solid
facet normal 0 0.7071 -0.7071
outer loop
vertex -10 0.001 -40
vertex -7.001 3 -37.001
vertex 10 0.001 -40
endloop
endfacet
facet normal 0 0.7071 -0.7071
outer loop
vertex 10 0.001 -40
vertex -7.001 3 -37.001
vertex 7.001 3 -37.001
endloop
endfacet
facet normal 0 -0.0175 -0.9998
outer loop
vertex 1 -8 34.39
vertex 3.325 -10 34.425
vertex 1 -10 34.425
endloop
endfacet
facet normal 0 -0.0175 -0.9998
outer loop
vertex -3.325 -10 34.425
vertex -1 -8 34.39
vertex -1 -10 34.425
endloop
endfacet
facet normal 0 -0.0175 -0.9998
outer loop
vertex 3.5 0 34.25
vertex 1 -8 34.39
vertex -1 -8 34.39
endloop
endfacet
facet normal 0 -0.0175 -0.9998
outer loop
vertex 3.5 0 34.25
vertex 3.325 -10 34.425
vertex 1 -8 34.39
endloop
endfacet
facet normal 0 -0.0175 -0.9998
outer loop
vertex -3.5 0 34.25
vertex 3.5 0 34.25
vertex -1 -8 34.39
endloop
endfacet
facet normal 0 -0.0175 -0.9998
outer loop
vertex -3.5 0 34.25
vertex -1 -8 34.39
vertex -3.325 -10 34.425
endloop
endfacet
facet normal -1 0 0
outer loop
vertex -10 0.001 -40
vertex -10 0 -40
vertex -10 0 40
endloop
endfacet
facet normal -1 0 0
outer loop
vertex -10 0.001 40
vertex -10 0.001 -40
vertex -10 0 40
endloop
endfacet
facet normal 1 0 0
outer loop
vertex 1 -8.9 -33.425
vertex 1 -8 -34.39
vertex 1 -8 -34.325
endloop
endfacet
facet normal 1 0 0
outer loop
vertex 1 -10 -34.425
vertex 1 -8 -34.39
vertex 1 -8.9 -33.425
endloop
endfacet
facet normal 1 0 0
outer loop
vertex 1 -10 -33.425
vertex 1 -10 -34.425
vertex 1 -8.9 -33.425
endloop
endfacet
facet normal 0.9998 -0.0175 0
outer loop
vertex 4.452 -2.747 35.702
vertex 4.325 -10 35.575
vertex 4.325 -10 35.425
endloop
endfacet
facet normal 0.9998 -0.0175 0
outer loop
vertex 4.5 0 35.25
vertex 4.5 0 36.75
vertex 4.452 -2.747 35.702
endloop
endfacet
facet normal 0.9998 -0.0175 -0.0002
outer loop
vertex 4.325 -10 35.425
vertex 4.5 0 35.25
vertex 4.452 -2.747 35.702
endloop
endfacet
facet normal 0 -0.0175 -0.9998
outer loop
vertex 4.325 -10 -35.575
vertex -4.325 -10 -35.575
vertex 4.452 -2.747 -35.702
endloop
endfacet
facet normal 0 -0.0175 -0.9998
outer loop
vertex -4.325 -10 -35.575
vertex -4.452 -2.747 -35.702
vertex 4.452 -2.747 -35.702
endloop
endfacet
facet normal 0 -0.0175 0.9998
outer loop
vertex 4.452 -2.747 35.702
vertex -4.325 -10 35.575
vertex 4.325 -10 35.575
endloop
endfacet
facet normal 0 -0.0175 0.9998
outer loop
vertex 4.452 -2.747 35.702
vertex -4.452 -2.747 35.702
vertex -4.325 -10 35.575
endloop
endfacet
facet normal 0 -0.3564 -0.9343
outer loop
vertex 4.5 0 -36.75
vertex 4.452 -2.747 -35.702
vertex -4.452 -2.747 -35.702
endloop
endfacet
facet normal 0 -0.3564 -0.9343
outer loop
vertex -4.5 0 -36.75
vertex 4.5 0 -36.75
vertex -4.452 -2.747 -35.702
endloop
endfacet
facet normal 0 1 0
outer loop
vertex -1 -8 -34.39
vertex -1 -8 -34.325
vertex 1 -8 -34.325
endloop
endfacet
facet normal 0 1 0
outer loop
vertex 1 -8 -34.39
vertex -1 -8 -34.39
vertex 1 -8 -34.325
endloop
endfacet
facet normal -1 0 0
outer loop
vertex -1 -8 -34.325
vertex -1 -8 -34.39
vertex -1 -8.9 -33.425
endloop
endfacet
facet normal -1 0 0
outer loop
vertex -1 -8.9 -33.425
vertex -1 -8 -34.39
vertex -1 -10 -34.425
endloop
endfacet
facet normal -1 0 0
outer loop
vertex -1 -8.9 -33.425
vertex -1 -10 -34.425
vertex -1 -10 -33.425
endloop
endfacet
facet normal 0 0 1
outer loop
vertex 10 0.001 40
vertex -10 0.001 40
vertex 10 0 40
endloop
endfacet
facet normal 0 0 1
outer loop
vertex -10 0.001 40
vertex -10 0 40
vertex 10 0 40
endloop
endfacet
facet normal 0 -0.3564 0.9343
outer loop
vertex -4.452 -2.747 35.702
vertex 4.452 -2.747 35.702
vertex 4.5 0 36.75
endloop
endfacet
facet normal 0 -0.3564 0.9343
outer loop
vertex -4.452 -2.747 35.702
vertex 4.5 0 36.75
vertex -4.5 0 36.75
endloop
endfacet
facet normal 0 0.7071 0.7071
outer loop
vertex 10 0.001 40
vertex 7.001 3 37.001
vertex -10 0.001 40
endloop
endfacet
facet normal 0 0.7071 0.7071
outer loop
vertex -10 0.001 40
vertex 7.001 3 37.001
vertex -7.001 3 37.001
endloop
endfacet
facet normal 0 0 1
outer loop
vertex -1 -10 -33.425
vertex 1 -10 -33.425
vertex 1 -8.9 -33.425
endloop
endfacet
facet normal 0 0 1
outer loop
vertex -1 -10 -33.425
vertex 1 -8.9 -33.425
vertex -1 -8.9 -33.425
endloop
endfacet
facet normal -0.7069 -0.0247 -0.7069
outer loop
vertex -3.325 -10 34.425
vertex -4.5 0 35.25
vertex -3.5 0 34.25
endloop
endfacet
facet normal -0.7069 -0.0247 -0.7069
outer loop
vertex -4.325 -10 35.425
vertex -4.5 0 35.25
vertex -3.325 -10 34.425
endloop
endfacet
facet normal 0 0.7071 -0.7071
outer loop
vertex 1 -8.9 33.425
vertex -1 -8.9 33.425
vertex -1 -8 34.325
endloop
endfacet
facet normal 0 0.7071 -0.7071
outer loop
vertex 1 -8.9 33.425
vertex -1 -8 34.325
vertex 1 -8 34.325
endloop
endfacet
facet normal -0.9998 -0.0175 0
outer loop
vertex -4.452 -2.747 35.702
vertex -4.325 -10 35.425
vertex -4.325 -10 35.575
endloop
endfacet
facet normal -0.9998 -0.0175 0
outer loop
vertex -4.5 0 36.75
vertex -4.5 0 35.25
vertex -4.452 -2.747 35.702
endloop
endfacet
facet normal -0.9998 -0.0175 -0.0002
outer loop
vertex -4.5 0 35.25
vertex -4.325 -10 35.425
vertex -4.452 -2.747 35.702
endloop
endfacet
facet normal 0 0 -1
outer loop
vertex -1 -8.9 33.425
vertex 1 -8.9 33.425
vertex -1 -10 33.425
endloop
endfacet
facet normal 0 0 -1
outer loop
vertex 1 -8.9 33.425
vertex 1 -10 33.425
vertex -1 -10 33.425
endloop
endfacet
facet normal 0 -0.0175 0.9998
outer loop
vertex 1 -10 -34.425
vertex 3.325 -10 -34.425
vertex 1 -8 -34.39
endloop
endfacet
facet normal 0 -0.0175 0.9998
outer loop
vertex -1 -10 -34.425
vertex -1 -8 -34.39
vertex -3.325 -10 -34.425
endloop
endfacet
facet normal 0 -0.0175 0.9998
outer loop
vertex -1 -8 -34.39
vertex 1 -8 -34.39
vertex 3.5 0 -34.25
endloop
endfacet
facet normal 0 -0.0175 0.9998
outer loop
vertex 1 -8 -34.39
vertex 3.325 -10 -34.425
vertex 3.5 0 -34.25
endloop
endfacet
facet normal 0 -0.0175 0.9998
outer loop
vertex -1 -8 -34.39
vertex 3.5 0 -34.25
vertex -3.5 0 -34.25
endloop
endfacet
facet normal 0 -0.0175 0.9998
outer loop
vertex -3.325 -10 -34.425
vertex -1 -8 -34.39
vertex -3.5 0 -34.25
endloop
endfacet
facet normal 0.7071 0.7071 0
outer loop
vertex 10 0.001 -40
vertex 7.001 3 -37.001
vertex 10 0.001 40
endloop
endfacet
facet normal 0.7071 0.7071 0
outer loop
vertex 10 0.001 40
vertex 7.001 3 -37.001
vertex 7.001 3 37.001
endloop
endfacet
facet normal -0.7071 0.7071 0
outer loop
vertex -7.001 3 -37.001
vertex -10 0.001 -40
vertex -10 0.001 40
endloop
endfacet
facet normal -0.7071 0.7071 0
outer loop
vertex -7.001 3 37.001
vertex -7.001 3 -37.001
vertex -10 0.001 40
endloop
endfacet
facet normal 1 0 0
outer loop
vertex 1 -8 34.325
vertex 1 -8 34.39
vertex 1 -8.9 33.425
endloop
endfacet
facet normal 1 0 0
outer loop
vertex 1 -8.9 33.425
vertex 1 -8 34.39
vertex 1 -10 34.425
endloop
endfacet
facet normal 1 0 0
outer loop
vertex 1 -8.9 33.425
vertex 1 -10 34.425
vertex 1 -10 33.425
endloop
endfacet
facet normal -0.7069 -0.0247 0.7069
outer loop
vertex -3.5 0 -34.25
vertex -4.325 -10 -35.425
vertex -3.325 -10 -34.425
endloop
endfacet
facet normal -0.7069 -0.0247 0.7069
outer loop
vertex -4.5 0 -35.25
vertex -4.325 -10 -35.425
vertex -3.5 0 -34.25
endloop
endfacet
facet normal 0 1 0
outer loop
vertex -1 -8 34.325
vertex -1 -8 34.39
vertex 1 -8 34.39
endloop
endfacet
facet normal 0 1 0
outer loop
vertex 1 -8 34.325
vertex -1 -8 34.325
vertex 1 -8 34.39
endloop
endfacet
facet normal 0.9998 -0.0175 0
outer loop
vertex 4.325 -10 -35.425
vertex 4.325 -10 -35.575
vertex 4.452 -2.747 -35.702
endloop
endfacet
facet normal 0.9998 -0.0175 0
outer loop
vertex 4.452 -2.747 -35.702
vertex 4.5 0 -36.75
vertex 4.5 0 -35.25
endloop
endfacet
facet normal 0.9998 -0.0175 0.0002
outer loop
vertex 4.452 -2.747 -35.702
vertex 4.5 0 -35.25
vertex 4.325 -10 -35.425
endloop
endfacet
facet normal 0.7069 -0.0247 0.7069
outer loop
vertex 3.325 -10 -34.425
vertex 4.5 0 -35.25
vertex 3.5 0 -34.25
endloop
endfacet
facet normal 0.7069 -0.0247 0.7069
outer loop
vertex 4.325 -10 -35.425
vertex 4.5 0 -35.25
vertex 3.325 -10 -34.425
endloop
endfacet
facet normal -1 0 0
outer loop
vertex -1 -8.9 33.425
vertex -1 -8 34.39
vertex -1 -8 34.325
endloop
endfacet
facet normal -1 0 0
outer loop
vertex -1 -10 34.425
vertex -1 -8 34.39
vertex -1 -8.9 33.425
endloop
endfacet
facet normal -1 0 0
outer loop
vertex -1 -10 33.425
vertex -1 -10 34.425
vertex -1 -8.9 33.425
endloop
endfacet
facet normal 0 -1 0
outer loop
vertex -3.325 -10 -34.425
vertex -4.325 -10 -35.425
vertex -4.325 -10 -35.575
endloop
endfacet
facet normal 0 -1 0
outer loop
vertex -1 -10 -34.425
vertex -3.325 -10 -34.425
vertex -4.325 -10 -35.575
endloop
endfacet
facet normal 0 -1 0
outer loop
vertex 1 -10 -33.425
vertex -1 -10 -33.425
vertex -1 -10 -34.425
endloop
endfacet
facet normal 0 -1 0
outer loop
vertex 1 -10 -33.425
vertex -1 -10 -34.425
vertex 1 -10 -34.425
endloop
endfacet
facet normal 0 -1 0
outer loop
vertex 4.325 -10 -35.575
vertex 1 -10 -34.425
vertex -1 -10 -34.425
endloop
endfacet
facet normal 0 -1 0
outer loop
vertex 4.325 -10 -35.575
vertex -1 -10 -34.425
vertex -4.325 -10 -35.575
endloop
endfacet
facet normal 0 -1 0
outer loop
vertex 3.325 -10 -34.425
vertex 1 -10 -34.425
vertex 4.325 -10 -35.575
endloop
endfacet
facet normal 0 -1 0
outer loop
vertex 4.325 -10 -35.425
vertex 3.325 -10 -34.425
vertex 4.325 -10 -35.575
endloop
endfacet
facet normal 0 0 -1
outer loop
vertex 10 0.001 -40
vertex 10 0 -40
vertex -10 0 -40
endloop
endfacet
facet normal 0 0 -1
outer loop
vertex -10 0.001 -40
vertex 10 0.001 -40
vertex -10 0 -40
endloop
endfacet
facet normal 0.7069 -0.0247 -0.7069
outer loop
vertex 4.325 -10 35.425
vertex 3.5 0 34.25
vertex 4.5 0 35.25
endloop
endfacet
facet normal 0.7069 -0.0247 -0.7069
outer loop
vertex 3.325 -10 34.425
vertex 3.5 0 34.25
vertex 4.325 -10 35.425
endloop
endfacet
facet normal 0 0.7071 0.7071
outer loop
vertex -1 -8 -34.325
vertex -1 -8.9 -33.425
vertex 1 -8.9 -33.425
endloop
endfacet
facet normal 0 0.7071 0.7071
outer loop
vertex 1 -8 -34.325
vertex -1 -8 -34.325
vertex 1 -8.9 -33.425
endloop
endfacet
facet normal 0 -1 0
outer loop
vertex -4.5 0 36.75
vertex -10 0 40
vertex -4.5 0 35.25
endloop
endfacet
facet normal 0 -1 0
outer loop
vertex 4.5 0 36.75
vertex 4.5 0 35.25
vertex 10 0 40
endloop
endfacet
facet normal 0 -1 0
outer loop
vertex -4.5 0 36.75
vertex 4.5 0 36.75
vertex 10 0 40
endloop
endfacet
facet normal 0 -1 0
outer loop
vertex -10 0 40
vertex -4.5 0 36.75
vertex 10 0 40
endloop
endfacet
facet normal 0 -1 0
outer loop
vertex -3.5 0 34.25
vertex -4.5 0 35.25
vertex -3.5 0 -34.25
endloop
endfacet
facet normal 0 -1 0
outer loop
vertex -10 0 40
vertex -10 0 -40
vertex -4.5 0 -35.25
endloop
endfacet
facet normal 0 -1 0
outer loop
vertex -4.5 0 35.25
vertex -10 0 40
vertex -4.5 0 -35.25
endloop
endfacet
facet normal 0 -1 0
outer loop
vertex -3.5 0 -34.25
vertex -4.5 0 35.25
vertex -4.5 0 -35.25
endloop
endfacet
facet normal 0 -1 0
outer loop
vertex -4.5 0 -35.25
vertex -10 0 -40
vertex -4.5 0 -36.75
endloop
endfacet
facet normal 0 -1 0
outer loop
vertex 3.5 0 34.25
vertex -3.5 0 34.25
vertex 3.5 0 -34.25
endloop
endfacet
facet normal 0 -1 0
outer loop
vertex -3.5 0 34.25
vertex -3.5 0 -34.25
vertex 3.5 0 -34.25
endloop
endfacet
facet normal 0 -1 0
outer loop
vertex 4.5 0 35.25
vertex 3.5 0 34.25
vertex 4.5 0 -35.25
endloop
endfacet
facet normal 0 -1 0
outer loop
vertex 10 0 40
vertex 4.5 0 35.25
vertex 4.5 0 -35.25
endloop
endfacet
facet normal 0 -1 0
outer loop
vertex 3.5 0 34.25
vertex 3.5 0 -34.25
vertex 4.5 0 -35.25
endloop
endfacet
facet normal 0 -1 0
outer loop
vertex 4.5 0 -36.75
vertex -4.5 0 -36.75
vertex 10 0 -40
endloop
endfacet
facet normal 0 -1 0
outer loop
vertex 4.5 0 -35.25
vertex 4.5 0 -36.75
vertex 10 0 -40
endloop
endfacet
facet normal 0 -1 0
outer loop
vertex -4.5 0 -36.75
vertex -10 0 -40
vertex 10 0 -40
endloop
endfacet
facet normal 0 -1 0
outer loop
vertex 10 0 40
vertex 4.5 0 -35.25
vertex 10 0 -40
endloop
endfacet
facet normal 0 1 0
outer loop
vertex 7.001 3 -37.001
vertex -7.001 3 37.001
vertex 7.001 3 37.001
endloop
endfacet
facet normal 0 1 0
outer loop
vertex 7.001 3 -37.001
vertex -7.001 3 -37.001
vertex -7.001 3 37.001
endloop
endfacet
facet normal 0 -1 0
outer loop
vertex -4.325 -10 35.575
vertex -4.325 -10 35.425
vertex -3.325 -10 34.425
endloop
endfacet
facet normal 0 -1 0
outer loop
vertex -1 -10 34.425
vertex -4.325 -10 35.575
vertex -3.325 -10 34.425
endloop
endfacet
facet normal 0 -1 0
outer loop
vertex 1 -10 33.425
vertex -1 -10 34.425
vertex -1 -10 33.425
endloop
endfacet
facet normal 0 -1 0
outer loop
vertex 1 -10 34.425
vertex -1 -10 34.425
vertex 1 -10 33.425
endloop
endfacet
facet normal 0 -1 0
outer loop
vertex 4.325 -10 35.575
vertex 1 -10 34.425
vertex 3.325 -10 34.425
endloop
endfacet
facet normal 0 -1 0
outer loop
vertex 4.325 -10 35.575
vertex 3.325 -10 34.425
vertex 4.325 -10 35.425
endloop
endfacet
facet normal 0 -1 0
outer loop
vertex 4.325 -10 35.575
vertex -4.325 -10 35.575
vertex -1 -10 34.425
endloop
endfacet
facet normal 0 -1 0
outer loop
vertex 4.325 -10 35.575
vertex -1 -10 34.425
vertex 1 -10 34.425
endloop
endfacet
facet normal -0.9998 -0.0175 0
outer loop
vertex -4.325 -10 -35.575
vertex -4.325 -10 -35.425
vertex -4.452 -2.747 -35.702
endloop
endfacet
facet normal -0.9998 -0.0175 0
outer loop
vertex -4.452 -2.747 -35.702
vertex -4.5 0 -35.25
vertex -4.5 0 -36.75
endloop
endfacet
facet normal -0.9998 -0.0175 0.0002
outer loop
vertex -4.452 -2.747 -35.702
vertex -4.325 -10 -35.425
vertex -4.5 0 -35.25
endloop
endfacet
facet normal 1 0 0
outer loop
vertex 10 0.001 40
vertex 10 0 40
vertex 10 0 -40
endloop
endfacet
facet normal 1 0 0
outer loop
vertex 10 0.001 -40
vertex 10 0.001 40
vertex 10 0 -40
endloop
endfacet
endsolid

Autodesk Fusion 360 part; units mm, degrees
sketch "Sketch1" plane through (0, 0, 0) normal (0, 1, 0) x (1, 0, 0)
  line L0 (10, 40) -> (-10, 40)
  line L1 (-10, 40) -> (-10, -40)
  line L2 (-10, -40) -> (10, -40)
  line L3 (10, -40) -> (10, 40)
  line L4 (10, 40) -> (-10, -40) construction
  line L5 (-10, 40) -> (10, -40) construction
  dimension "d1" = 20
  dimension "d2" = 80
extrude "Extrude1" add sketch "Sketch1" along normal blind 3
sketch "Sketch2" plane through (0, 0, 0) normal (0, -1, 0) x (1, 0, 0)
  line L0 (10, -40) -> (10, 40)
  line L1 (10, 40) -> (-10, 40)
  line L2 (-10, 40) -> (-10, -40)
  line L3 (-10, -40) -> (10, -40)
  line L4 (0, 48.0121) -> (0, -47.4969) construction
  line L5 (-22.9199, 34) -> (18.1137, 34) construction
  line L6 (-4.5, 35.75) -> (4.5, 35.75)
  line L7 (4.5, 35.75) -> (4.5, 34.25)
  line L8 (4.5, 34.25) -> (-4.5, 34.25)
  line L9 (-4.5, 34.25) -> (-4.5, 35.75)
  line L10 (29.4296, -34) -> (-24.7341, -34) construction
  line L11 (-4.5, -35.75) -> (4.5, -35.75)
  line L12 (4.5, -35.75) -> (4.5, -34.25)
  line L13 (4.5, -34.25) -> (-4.5, -34.25)
  line L14 (-4.5, -34.25) -> (-4.5, -35.75)
  dimension "d5" = 6
  dimension "d6" = 9
  dimension "d7" = 0.25
  dimension "d8" = 10
  dimension "d9" = 4.5
  dimension "d10" = 6
  dimension "d11" = 9
  dimension "d12" = 1.5
  dimension "d13" = 1.5
  dimension "d14" = 0.25
  dimension "d15" = 4.5
extrude "Extrude2" add sketch "Sketch2" along normal blind 10 draft -1 contours L6 L7 L8 L9 | L11 L12 L13 L14
chamfer "Chamfer1" distance 3 angle 45 4 edges at (-10, 3, 0) (0, 3, -40) (10, 3, 0) (0, 3, 40)
chamfer "Chamfer2" distance 1 angle 45 4 edges at (-4.4127, -5, -34.3373) (4.4127, -5, -34.3373) (-4.4127, -5, 34.3373) (4.4127, -5, 34.3373)
sketch "Sketch5" plane through (0, -10, 0) normal (0, -1, 0) x (1, 0, 0)
  line L0 (3.3253, 34.4246) -> (4.3254, 35.4247)
  line L1 (4.3254, 35.4247) -> (4.3254, 35.5754)
  line L2 (4.3254, 35.5754) -> (-4.3254, 35.5754)
  line L3 (-4.3254, 35.5754) -> (-4.3254, 35.4247)
  line L4 (-4.3254, 35.4247) -> (-3.3253, 34.4246)
  line L5 (-3.3253, 34.4246) -> (3.3253, 34.4246)
  line L6 (0, 34.4246) -> (1, 34.4246)
  line L7 (1, 34.4246) -> (1, 33.4246)
  line L8 (1, 33.4246) -> (0, 33.4246)
  line L9 (0, 33.4246) -> (0, 34.4246)
  line L10 (0, 34.4246) -> (-1, 34.4246)
  line L11 (-1, 34.4246) -> (-1, 33.4246)
  line L12 (-1, 33.4246) -> (0, 33.4246)
  line L13 (0, 33.4246) -> (0, 34.4246)
  dimension "d29" = 1
  dimension "d30" = 1
  dimension "d31" = 1
sketch "Sketch6" plane through (0, -10, 0) normal (0, -1, 0) x (1, 0, 0)
  line L0 (4.3254, -35.4247) -> (3.3253, -34.4246)
  line L1 (3.3253, -34.4246) -> (-3.3253, -34.4246)
  line L2 (-3.3253, -34.4246) -> (-4.3254, -35.4247)
  line L3 (-4.3254, -35.4247) -> (-4.3254, -35.5754)
  line L4 (-4.3254, -35.5754) -> (4.3254, -35.5754)
  line L5 (4.3254, -35.5754) -> (4.3254, -35.4247)
  line L6 (0, -34.4246) -> (1, -34.4246)
  line L7 (1, -34.4246) -> (1, -33.4246)
  line L8 (1, -33.4246) -> (0, -33.4246)
  line L9 (0, -33.4246) -> (0, -34.4246)
  line L10 (0, -34.4246) -> (-1, -34.4246)
  line L11 (-1, -34.4246) -> (-1, -33.4246)
  line L12 (-1, -33.4246) -> (0, -33.4246)
  line L13 (0, -33.4246) -> (0, -34.4246)
  dimension "d32" = 1
  dimension "d33" = 1
  dimension "d34" = 1
extrude "Extrude4" add sketch "Sketch5" sketch "Sketch6" against normal blind 2 contours L5 L6 L7 L8 L9 L13 | L5 L9 L10 L11 L12 L13 of sketch 2 contours L1 L6 L7 L8 L9 L13 | L1 L9 L10 L11 L12 L13
chamfer "Chamfer4" distance 0.9 angle 45 2 edges at (0, -8, -33.4246) (0, -8, 33.4246)
chamfer "Chamfer5" distance 1 angle 70 2 edges at (0, 0, 35.75) (0, 0, -35.75) measured on face at (1.1666, 0, 11.4167) measured on face at (1.1666, 0, 11.4167)
equation "d9 = d6 / 2"
equation "d15 = d11 / 2"
